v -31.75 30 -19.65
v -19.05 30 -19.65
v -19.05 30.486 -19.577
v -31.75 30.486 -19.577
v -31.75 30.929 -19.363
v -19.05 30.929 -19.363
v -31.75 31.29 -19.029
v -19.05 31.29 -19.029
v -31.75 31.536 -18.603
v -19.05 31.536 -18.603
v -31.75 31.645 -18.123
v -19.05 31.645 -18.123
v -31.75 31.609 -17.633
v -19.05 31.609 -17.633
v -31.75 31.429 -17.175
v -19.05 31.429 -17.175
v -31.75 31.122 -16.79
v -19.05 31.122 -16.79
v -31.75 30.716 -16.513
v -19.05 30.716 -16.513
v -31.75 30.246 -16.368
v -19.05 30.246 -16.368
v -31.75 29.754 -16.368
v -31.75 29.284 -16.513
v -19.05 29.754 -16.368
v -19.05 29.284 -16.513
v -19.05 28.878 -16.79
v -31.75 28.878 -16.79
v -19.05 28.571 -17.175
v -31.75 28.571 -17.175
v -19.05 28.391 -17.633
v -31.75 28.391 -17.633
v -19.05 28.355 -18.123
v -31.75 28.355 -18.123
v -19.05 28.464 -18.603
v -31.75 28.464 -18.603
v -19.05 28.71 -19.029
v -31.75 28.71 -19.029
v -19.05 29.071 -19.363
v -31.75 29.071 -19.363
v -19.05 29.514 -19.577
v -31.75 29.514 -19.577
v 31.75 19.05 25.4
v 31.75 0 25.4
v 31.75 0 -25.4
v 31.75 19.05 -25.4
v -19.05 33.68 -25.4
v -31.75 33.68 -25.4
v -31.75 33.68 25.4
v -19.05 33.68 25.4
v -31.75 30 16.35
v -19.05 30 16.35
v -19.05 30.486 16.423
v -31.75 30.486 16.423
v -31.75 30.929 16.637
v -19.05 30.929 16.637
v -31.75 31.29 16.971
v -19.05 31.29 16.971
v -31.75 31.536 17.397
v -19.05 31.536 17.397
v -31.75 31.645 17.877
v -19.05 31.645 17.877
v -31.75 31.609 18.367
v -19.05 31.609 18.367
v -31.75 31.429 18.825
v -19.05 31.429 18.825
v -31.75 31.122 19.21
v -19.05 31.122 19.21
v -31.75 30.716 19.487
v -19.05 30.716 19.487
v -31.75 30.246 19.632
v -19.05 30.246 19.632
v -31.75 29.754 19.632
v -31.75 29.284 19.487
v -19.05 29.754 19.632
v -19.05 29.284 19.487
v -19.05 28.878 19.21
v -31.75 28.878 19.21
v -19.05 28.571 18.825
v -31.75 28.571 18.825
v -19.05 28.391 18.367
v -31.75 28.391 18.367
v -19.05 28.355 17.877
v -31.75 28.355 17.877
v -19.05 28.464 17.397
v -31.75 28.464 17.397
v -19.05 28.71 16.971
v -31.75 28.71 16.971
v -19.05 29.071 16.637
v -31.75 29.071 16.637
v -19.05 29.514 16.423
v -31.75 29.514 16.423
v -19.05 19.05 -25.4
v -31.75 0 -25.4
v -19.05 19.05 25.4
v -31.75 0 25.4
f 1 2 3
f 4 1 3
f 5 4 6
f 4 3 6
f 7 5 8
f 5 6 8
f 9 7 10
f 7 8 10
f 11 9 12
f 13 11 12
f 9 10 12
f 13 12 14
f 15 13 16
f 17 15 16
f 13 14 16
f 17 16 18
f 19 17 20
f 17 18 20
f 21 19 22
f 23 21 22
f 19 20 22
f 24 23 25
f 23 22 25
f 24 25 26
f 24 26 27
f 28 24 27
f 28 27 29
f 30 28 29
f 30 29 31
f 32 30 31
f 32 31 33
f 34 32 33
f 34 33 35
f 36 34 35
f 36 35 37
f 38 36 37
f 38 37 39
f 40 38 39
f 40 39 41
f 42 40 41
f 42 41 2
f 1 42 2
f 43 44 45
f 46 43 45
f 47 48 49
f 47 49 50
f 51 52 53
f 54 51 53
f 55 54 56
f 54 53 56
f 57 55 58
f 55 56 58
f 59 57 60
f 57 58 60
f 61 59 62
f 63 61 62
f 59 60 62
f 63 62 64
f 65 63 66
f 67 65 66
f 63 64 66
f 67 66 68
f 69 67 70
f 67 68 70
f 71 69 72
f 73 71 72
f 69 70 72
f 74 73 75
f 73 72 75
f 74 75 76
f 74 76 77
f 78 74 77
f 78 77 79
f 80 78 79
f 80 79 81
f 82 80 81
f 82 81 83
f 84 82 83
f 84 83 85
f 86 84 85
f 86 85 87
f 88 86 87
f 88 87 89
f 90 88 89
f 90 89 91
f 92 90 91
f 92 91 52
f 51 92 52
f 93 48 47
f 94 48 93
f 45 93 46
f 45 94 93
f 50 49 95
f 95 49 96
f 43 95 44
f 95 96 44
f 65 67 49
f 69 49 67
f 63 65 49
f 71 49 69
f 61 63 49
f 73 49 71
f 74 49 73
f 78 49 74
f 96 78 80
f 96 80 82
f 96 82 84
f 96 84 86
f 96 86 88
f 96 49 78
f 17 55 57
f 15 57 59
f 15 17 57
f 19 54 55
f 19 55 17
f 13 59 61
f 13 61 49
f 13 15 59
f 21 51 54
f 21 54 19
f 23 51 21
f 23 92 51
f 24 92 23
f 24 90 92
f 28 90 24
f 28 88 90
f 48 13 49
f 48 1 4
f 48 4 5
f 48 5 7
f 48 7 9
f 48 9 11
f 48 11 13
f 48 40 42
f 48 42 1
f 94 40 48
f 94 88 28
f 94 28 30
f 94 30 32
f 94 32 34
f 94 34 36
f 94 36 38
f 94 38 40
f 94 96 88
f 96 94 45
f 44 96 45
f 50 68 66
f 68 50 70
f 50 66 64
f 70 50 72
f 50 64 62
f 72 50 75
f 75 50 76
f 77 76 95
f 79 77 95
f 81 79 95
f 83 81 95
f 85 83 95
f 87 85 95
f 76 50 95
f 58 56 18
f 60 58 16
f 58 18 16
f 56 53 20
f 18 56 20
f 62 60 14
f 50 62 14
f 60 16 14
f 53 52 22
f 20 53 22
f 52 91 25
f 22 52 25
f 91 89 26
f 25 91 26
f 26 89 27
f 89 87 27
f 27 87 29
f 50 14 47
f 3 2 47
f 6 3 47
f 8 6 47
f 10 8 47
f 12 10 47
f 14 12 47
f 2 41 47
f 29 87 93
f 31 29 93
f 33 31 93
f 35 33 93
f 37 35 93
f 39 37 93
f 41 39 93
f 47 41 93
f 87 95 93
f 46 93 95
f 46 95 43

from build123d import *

# Parameters (mm, degrees)
SKETCH1_W             = 50.8
SKETCH1_H             = 50.8
BOSS_EXTRUDE1_DEPTH   = 19.05
SKETCH1_3_W           = 12.7
SKETCH1_3_H           = 50.8
BOSS_EXTRUDE2_DEPTH   = 33.6804
M4X0_7_TAPPED_HOLE1_D = 3.3


with BuildPart() as part:
    # Sketch1 → Boss-Extrude1 (new body)
    with BuildSketch(Plane(origin=(0, 0, 0), x_dir=(1, 0, 0), z_dir=(0, 1, 0))):
        with Locations((6.35, 0)):
            Rectangle(SKETCH1_W, SKETCH1_H)
    extrude(amount=BOSS_EXTRUDE1_DEPTH)

    # Sketch1<3> → Boss-Extrude2 (add)
    with BuildSketch(Plane(origin=(0, 0, 0), x_dir=(1, 0, 0), z_dir=(0, 1, 0))):
        with Locations((-25.4, 0)):
            Rectangle(SKETCH1_3_W, SKETCH1_3_H)
    extrude(amount=BOSS_EXTRUDE2_DEPTH)

    # M4x0.7 Tapped Hole1 (through all)
    with Locations(Plane.ZY.offset(31.75)):
        with Locations((18, 30), (-18, 30)):
            Hole(M4X0_7_TAPPED_HOLE1_D / 2)


solid = part.part
